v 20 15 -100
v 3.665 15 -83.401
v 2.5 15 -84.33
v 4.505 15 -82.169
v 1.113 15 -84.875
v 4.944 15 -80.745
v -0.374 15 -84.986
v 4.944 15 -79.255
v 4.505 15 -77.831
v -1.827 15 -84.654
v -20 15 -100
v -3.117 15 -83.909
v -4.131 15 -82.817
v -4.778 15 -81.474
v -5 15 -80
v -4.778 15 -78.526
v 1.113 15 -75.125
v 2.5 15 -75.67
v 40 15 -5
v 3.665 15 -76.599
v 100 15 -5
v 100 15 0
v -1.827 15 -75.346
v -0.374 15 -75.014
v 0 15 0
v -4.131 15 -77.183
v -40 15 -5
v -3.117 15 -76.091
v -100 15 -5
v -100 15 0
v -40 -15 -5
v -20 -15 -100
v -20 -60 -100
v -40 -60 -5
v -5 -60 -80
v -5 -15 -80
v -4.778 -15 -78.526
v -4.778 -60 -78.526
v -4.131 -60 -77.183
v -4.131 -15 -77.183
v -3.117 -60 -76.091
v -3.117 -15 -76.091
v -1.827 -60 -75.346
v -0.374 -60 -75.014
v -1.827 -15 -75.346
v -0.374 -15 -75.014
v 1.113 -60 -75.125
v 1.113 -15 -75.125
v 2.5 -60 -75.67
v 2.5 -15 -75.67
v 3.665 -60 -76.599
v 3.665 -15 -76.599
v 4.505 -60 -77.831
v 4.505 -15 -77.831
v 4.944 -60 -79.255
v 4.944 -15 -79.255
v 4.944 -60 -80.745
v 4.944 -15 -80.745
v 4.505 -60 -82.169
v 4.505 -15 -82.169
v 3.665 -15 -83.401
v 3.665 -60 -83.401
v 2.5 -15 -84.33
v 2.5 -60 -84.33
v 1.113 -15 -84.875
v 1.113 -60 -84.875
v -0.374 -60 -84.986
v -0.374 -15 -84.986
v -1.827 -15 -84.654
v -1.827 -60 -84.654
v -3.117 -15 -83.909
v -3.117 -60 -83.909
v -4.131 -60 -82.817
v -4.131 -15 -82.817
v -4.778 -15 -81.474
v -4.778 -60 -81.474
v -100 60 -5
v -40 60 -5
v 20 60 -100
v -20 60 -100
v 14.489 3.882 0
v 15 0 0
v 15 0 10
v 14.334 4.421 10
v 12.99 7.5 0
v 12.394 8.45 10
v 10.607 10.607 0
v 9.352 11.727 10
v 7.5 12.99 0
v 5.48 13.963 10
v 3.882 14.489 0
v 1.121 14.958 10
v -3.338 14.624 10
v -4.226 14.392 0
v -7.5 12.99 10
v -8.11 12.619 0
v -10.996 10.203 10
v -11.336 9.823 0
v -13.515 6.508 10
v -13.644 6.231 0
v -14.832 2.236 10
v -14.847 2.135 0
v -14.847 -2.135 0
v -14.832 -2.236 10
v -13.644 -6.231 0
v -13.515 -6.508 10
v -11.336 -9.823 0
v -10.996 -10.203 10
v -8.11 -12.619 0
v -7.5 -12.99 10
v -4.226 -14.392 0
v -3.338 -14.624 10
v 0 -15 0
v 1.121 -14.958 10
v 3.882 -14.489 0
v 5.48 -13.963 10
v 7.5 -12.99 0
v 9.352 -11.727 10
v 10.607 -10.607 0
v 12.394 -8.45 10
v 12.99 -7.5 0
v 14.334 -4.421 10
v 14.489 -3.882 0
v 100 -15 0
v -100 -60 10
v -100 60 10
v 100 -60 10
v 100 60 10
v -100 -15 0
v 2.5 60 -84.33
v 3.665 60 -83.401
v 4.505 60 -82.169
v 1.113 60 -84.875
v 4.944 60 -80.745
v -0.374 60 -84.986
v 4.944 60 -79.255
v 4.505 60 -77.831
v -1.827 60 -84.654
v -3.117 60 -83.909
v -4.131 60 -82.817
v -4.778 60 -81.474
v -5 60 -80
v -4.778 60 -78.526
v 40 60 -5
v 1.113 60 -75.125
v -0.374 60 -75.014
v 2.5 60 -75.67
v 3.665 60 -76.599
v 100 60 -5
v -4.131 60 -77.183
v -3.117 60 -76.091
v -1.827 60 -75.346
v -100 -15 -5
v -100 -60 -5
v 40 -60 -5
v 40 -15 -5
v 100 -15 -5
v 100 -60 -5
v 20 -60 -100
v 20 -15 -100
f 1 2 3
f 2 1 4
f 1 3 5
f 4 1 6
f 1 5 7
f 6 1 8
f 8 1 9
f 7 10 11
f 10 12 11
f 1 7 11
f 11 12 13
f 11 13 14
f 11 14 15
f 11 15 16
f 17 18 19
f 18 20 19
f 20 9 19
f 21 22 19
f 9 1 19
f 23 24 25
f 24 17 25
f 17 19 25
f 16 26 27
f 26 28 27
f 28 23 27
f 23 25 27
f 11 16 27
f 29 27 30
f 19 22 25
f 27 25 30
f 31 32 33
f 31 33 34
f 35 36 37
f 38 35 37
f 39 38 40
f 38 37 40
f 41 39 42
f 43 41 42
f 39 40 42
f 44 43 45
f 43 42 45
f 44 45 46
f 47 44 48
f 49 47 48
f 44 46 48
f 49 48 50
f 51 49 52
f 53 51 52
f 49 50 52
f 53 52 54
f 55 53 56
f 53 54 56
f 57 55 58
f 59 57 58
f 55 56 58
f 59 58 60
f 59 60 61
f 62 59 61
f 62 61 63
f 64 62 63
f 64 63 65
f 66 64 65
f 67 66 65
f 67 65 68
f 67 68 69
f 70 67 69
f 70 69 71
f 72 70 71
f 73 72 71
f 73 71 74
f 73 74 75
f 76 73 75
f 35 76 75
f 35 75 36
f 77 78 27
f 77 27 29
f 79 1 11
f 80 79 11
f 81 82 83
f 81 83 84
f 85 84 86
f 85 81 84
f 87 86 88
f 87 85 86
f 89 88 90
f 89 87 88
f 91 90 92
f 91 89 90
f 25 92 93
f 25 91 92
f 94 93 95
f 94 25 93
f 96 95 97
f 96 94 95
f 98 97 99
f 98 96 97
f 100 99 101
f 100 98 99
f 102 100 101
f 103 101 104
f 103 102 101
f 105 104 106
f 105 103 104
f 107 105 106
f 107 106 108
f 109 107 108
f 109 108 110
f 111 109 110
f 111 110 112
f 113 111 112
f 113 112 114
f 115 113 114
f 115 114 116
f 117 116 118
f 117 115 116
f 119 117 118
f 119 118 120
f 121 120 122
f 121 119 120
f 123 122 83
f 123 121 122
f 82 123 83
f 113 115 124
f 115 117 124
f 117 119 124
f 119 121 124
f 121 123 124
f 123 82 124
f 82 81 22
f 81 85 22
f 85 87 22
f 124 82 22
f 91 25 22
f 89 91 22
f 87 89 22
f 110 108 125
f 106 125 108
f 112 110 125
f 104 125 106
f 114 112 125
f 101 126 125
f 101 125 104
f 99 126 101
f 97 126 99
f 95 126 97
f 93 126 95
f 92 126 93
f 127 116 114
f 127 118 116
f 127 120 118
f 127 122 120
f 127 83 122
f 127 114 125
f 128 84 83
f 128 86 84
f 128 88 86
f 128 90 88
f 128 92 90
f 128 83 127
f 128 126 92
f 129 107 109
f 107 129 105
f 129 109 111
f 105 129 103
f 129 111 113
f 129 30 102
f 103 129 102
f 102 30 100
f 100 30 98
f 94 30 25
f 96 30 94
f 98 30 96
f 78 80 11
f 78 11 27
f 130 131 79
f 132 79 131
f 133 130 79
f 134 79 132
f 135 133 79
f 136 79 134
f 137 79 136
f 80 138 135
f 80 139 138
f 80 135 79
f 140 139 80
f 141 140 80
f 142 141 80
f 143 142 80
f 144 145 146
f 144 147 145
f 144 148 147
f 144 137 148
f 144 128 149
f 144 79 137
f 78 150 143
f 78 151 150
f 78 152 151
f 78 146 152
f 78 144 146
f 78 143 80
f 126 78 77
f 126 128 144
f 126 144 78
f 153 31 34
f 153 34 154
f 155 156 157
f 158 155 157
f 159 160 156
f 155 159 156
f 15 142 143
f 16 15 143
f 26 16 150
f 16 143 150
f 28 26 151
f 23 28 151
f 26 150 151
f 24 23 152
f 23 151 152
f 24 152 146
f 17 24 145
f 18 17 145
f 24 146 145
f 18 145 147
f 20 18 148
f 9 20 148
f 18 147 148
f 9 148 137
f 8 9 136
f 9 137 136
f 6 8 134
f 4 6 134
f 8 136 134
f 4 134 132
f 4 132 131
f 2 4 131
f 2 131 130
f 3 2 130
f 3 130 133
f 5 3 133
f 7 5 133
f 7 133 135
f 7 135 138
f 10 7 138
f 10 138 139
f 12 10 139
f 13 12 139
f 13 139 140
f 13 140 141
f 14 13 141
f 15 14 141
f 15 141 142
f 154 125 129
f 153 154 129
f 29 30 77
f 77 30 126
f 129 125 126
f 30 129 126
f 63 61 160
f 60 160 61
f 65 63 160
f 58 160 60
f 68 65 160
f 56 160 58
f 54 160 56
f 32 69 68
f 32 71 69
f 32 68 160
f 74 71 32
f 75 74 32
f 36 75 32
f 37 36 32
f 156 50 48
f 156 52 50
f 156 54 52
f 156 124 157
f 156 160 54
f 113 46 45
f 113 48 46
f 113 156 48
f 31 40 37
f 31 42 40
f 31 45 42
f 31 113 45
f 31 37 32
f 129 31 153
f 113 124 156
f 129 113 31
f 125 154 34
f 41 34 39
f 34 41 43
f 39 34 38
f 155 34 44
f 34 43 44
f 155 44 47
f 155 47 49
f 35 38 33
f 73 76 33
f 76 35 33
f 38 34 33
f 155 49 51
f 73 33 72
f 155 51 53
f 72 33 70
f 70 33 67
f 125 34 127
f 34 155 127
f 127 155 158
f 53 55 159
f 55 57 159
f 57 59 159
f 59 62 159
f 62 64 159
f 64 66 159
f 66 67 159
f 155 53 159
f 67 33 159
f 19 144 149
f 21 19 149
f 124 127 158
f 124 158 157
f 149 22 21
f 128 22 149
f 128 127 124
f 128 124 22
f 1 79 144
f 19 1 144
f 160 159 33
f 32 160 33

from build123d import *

# Parameters (mm, degrees)
SKETCH_1_W          = 200
SKETCH_1_H          = 120
SKETCH_1_R          = 15
EXTRUDE_1_DEPTH     = 10
SKETCH_2_W          = 200
SKETCH_2_H          = 45
EXTRUDE_2_DEPTH     = 100
SKETCH_3_R          = 5
CUT_EXTRUDE_1_DEPTH = 186.47236991


with BuildPart() as part:
    # 草图1 → 凸台-拉伸1 (new body)
    with BuildSketch(Plane.XY):
        Rectangle(SKETCH_1_W, SKETCH_1_H)
        Circle(SKETCH_1_R, mode=Mode.SUBTRACT)
    extrude(amount=EXTRUDE_1_DEPTH)

    # 草图2 → 凸台-拉伸2 (add)
    with BuildSketch(Plane(origin=(0, 0, 0), x_dir=(-1, 0, 0), z_dir=(0, 0, -1))):
        with Locations((0, 37.5)):
            Rectangle(SKETCH_2_W, SKETCH_2_H)
        with Locations((0, -37.5)):
            Rectangle(SKETCH_2_W, SKETCH_2_H)
    extrude(amount=EXTRUDE_2_DEPTH)

    # 草图3 → 切除-拉伸1 (cut, through all)
    with BuildSketch(Plane(origin=(0, 60, 0), x_dir=(1, 0, 0), z_dir=(0, 1, 0))):
        with Locations(Location((0, 80, 0), (0, 0, 180))):
            Circle(SKETCH_3_R)
        Polygon((-100, 5), (-100, 100), (-20, 100), (-40, 5), align=None)
        Polygon((100, 100), (20, 100), (40, 5), (100, 5), align=None)
    extrude(amount=-CUT_EXTRUDE_1_DEPTH, mode=Mode.SUBTRACT)


solid = part.part
